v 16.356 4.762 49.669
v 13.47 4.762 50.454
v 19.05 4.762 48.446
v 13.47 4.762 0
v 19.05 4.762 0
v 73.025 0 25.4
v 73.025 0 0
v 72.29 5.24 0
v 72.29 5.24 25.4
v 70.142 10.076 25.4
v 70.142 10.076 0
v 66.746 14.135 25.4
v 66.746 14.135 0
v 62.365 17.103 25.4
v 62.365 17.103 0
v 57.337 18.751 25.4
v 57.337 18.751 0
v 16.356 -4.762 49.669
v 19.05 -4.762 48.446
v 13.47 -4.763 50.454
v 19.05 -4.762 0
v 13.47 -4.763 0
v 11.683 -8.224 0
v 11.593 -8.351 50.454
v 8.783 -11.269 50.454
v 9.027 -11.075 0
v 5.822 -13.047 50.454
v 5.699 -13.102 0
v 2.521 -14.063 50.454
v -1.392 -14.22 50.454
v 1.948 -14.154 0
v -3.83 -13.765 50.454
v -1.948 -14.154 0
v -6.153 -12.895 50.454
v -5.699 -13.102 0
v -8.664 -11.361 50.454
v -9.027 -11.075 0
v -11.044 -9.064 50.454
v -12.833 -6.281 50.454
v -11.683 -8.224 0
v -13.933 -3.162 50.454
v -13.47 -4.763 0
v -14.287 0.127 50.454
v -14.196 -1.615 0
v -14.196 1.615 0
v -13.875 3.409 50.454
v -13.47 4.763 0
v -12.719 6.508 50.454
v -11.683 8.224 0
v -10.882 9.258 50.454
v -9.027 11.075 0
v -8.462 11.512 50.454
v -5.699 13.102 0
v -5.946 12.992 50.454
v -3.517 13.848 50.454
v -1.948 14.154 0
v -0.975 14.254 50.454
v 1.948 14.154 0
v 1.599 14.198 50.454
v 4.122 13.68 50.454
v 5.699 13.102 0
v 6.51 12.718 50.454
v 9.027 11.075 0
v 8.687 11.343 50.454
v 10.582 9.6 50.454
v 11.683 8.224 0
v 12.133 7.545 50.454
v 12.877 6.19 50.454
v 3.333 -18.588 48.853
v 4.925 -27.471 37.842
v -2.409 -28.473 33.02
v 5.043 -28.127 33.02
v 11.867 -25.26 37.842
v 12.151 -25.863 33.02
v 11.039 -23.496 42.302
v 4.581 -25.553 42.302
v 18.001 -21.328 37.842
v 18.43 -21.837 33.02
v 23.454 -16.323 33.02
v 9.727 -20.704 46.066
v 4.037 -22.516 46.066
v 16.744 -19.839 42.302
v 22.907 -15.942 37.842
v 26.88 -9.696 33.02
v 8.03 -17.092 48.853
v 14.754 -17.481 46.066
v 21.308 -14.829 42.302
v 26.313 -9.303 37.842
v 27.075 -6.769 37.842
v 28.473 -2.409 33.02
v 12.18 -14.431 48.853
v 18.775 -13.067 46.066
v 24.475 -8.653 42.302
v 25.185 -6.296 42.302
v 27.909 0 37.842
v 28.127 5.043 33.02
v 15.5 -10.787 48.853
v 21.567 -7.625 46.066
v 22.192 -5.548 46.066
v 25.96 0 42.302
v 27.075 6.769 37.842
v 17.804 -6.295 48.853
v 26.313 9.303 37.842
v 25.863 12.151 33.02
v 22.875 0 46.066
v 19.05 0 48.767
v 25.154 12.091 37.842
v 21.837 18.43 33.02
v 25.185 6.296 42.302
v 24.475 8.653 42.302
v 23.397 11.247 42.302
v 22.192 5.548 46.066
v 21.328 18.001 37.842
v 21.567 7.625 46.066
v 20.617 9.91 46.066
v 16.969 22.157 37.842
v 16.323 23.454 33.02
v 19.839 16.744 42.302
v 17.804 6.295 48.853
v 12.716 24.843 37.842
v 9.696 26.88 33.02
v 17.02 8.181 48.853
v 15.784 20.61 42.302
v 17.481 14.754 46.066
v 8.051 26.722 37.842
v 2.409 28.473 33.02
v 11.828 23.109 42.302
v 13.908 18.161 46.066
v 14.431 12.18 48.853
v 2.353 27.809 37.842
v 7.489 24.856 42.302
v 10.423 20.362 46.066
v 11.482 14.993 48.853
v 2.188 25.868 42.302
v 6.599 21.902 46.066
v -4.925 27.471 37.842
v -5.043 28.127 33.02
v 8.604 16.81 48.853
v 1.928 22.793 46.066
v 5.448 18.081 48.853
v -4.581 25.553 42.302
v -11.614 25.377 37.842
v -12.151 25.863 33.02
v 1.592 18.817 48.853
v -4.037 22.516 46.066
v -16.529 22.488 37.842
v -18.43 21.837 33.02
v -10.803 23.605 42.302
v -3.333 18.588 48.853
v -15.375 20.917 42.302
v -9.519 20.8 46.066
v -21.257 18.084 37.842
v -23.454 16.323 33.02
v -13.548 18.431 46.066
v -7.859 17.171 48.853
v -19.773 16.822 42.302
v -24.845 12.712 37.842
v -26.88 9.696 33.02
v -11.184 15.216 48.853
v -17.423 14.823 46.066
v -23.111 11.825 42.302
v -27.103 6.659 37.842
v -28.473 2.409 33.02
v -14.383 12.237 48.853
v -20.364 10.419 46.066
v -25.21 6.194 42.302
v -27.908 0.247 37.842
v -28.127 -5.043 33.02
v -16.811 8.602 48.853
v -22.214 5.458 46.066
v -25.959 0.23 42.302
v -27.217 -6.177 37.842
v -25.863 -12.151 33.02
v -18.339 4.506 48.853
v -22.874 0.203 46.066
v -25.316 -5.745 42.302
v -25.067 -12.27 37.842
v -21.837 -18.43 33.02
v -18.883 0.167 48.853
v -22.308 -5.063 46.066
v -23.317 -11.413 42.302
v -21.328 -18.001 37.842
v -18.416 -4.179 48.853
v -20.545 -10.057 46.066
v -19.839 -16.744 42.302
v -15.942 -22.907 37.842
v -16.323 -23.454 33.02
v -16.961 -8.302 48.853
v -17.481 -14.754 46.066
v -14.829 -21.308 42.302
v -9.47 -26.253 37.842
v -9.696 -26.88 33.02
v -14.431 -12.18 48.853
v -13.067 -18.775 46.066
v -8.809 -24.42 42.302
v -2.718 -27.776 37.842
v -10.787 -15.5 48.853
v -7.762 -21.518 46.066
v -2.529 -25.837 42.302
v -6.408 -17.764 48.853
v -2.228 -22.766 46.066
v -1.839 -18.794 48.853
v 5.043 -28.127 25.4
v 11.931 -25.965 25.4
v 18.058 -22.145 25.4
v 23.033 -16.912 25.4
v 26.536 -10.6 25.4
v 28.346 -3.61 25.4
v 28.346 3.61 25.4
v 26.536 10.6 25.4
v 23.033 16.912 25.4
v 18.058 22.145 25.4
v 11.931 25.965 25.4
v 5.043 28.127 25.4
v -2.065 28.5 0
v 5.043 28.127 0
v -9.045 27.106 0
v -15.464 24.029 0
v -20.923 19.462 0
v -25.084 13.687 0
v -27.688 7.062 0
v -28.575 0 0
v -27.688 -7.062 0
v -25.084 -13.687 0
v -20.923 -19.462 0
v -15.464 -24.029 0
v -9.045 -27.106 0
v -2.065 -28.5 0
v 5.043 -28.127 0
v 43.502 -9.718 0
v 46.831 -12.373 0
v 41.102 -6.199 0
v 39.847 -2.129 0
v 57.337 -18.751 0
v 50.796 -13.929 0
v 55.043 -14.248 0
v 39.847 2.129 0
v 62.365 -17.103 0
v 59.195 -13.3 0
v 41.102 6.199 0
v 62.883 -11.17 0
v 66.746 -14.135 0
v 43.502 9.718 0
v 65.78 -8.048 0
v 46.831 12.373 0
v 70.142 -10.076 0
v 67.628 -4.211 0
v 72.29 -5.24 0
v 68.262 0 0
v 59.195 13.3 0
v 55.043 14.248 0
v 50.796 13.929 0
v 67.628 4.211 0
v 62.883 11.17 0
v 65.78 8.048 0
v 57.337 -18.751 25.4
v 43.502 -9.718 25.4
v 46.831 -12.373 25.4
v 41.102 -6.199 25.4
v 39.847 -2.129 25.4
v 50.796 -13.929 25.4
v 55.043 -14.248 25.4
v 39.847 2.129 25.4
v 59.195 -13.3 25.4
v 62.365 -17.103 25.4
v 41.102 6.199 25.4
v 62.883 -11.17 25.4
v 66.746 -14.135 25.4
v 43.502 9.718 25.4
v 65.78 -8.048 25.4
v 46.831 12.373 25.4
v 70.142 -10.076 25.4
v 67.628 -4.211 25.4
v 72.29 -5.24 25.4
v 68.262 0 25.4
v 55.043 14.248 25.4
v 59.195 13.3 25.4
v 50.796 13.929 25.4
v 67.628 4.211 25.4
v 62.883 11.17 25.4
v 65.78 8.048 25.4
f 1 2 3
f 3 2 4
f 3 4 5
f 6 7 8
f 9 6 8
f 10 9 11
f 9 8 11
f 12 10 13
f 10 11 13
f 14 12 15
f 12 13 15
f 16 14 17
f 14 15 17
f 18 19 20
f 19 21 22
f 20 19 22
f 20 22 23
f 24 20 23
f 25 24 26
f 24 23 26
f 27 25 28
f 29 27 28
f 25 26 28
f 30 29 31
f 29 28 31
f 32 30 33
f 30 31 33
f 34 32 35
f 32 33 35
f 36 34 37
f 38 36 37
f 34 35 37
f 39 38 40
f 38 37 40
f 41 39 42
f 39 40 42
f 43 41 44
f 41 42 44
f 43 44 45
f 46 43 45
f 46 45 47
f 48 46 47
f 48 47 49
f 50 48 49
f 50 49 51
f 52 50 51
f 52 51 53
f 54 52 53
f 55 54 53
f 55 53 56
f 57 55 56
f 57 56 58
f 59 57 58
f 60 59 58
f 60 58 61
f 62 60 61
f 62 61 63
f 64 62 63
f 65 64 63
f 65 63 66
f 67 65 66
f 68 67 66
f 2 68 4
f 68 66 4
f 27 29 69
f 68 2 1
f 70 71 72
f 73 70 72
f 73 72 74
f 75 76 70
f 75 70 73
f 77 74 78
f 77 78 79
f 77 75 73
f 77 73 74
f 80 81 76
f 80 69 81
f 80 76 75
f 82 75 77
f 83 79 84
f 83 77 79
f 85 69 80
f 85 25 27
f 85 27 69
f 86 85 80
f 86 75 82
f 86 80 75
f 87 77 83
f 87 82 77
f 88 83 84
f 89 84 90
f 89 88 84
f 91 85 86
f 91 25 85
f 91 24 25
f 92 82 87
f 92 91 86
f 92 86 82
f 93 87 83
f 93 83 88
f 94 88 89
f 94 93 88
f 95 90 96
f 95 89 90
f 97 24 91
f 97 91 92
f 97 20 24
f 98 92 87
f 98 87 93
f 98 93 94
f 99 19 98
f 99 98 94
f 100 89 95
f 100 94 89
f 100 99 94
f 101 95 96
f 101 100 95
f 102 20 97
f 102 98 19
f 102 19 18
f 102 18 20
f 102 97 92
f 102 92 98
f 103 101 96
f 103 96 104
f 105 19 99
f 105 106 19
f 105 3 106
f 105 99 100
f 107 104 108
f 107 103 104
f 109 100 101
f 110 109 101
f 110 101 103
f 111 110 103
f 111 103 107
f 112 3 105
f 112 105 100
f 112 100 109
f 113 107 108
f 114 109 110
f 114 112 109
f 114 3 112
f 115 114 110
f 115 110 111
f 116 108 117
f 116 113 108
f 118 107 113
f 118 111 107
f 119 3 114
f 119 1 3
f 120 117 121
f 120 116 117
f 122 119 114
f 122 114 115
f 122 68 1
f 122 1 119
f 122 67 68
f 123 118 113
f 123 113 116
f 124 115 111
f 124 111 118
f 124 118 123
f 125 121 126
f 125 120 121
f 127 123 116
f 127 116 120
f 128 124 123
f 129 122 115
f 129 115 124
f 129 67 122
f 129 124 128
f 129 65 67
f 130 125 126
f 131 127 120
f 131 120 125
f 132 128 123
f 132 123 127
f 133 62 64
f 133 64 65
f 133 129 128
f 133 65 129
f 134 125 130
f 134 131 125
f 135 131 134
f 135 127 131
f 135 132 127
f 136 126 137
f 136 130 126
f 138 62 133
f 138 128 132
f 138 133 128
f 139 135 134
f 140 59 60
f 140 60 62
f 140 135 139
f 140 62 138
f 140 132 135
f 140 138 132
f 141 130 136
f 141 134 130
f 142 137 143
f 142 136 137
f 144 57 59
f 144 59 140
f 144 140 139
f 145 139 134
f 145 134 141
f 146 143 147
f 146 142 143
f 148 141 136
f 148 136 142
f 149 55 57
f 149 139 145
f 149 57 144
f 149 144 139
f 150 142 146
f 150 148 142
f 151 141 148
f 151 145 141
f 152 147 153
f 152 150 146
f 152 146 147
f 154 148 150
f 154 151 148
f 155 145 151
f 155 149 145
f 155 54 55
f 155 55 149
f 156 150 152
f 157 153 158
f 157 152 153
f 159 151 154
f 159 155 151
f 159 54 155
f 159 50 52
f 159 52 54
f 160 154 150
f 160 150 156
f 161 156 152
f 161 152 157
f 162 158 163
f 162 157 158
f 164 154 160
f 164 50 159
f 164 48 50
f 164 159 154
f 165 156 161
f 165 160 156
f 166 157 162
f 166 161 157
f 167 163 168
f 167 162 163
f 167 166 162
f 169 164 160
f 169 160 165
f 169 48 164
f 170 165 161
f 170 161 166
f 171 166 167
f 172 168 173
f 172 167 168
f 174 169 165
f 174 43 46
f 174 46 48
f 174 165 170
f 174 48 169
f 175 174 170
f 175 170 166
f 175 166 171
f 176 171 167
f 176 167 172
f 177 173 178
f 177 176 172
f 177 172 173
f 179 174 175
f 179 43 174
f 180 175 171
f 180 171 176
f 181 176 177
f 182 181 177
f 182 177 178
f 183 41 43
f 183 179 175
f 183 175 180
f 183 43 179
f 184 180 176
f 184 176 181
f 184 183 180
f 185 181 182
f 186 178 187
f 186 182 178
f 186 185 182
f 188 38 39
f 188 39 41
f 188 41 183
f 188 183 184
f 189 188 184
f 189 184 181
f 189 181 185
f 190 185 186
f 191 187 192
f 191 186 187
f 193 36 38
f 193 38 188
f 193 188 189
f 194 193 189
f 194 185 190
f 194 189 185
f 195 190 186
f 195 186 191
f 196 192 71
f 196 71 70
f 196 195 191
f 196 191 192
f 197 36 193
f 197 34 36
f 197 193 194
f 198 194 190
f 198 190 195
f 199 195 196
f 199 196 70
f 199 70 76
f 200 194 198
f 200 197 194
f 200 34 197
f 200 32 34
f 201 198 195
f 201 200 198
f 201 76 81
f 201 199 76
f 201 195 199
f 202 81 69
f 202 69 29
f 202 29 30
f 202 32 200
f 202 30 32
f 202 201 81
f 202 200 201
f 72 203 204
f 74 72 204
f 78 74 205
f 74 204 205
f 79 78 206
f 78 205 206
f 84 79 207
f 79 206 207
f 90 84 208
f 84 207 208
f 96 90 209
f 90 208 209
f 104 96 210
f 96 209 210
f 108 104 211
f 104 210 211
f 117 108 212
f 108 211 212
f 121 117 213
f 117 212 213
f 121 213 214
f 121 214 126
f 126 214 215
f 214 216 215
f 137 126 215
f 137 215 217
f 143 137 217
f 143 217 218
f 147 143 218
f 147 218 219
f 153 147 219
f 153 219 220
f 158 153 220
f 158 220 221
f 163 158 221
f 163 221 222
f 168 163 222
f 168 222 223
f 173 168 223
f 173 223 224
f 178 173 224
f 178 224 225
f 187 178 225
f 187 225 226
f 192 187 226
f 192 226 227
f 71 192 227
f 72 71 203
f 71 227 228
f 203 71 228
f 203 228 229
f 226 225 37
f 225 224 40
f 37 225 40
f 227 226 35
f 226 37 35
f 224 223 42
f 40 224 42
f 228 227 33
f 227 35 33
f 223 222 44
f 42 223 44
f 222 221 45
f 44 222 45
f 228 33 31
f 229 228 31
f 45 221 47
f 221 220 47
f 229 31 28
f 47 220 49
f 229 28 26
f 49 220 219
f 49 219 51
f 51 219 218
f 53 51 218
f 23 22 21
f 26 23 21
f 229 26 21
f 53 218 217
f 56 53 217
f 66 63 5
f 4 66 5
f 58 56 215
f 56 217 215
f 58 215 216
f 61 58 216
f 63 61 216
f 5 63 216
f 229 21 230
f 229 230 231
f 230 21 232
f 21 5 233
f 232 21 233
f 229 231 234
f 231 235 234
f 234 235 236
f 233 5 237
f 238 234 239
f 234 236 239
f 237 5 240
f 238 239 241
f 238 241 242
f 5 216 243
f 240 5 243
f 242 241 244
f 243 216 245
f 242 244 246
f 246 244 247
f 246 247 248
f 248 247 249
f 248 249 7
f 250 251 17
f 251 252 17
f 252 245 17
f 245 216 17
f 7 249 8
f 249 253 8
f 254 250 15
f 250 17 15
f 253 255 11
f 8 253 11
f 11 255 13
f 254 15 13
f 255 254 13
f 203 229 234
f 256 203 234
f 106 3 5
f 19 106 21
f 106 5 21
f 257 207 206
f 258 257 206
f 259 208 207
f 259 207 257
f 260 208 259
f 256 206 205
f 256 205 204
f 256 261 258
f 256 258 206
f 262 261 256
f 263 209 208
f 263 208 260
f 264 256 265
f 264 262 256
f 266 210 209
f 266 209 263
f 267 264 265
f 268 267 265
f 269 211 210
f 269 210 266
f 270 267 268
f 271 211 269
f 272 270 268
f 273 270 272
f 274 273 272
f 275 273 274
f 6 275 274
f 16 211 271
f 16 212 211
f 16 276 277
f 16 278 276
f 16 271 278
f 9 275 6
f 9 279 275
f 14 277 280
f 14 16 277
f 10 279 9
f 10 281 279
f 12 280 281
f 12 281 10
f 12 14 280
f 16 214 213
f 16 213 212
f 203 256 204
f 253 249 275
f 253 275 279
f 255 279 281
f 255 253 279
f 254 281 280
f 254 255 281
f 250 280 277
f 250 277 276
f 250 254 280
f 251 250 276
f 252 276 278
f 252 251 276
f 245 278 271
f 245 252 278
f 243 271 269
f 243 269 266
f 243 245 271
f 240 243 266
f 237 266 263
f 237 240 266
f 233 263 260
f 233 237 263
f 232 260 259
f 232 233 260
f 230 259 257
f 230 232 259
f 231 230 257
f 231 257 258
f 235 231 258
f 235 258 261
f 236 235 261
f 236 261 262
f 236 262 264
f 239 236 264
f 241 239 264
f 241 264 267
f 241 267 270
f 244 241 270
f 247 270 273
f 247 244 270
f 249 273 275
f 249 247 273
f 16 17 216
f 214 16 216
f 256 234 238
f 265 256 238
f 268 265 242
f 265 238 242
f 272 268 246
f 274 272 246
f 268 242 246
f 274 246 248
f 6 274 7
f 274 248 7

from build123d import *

# Parameters (mm, degrees)
F0_R     = 14.2875
F1_DEPTH = 25.4
F2_DEPTH = 50.8


# Not quite as in the source:
# - a fillet or chamfer that OpenCascade refuses, or shapes differently, is made with other operations: its cross-section is extruded or revolved along the edge and cut away or added


with BuildPart() as f1:
    # F0 (on Top) → F1 (new body)
    with BuildSketch(Plane.XY):
        with BuildLine():
            ThreePointArc((5.0426470588, -28.1265414802), (21.9160245563, -18.3362616868), (28.575, 0))
            ThreePointArc((28.575, 0), (21.9160245563, 18.3362616868), (5.0426470588, 28.1265414802))
            ThreePointArc((5.0426470588, 28.1265414802), (-28.575, 0), (5.0426470588, -28.1265414802))
        make_face()
        with BuildLine():
            ThreePointArc((-13.4703841816, 4.7625), (0, 14.2875), (13.4703841816, 4.7625))
            Line((13.4703841816, 4.7625), (19.05, 4.7625))
            Line((19.05, 4.7625), (19.05, -4.7625))
            Line((19.05, -4.7625), (13.4703841816, -4.7625))
            ThreePointArc((13.4703841816, -4.7625), (0, -14.2875), (-13.4703841816, -4.7625))
            Line((-13.4703841816, -4.7625), (-19.05, -4.7625))
            Line((-19.05, -4.7625), (-19.05, 4.7625))
            Line((-19.05, 4.7625), (-13.4703841816, 4.7625))
        make_face(mode=Mode.SUBTRACT)
        with BuildLine():
            ThreePointArc((5.0426470588, 28.1265414802), (21.9160245563, 18.3362616868), (28.575, 0))
            ThreePointArc((28.575, 0), (21.9160245563, -18.3362616868), (5.0426470588, -28.1265414802))
            Line((5.0426470588, -28.1265414802), (57.3367647059, -18.7510276535))
            ThreePointArc((57.3367647059, -18.7510276535), (34.925, 0), (57.3367647059, 18.7510276535))
            Line((57.3367647059, 18.7510276535), (5.0426470588, 28.1265414802))
        make_face()
        with BuildLine():
            ThreePointArc((-13.4703841816, -4.7625), (-14.2875, 0), (-13.4703841816, 4.7625))
            Line((-13.4703841816, 4.7625), (-19.05, 4.7625))
            Line((-19.05, 4.7625), (-19.05, -4.7625))
            Line((-19.05, -4.7625), (-13.4703841816, -4.7625))
        make_face()
        with BuildLine():
            ThreePointArc((73.025, 0), (68.5856830375, 12.2241744579), (57.3367647059, 18.7510276535))
            ThreePointArc((57.3367647059, 18.7510276535), (34.925, 0), (57.3367647059, -18.7510276535))
            ThreePointArc((57.3367647059, -18.7510276535), (68.5856830375, -12.2241744579), (73.025, 0))
        make_face()
        with Locations((53.975, 0)):
            Circle(F0_R, mode=Mode.SUBTRACT)
    extrude(amount=F1_DEPTH)

    # F0 (on Top) → F2 (join)
    with BuildSketch(Plane.XY):
        with BuildLine():
            ThreePointArc((5.0426470588, -28.1265414802), (21.9160245563, -18.3362616868), (28.575, 0))
            ThreePointArc((28.575, 0), (21.9160245563, 18.3362616868), (5.0426470588, 28.1265414802))
            ThreePointArc((5.0426470588, 28.1265414802), (-28.575, 0), (5.0426470588, -28.1265414802))
        make_face()
        with BuildLine():
            ThreePointArc((-13.4703841816, 4.7625), (0, 14.2875), (13.4703841816, 4.7625))
            Line((13.4703841816, 4.7625), (19.05, 4.7625))
            Line((19.05, 4.7625), (19.05, -4.7625))
            Line((19.05, -4.7625), (13.4703841816, -4.7625))
            ThreePointArc((13.4703841816, -4.7625), (0, -14.2875), (-13.4703841816, -4.7625))
            Line((-13.4703841816, -4.7625), (-19.05, -4.7625))
            Line((-19.05, -4.7625), (-19.05, 4.7625))
            Line((-19.05, 4.7625), (-13.4703841816, 4.7625))
        make_face(mode=Mode.SUBTRACT)
        with BuildLine():
            ThreePointArc((-13.4703841816, -4.7625), (-14.2875, 0), (-13.4703841816, 4.7625))
            Line((-13.4703841816, 4.7625), (-19.05, 4.7625))
            Line((-19.05, 4.7625), (-19.05, -4.7625))
            Line((-19.05, -4.7625), (-13.4703841816, -4.7625))
        make_face()
    extrude(amount=F2_DEPTH)

    # F3: fillet of radius 17.78 on 1 edges, made by hand

    # F3_s1 → F3_t2 (revolve, cut)
    with BuildSketch(Plane(origin=(0, 0, 0), x_dir=(0, 0, 1), z_dir=(-0.9843059136, -0.1764705882, 0))):
        with BuildLine():
            ThreePointArc((33.02, -28.575), (45.5923585695, -23.3673585695), (50.8, -10.795))
            Line((50.8, -10.795), (50.8, -28.575))
            Line((50.8, -28.575), (33.02, -28.575))
        make_face()
    revolve(axis=Axis((0, 0, 50.8), (0, 0, 1)), mode=Mode.SUBTRACT)


solid = f1.part
